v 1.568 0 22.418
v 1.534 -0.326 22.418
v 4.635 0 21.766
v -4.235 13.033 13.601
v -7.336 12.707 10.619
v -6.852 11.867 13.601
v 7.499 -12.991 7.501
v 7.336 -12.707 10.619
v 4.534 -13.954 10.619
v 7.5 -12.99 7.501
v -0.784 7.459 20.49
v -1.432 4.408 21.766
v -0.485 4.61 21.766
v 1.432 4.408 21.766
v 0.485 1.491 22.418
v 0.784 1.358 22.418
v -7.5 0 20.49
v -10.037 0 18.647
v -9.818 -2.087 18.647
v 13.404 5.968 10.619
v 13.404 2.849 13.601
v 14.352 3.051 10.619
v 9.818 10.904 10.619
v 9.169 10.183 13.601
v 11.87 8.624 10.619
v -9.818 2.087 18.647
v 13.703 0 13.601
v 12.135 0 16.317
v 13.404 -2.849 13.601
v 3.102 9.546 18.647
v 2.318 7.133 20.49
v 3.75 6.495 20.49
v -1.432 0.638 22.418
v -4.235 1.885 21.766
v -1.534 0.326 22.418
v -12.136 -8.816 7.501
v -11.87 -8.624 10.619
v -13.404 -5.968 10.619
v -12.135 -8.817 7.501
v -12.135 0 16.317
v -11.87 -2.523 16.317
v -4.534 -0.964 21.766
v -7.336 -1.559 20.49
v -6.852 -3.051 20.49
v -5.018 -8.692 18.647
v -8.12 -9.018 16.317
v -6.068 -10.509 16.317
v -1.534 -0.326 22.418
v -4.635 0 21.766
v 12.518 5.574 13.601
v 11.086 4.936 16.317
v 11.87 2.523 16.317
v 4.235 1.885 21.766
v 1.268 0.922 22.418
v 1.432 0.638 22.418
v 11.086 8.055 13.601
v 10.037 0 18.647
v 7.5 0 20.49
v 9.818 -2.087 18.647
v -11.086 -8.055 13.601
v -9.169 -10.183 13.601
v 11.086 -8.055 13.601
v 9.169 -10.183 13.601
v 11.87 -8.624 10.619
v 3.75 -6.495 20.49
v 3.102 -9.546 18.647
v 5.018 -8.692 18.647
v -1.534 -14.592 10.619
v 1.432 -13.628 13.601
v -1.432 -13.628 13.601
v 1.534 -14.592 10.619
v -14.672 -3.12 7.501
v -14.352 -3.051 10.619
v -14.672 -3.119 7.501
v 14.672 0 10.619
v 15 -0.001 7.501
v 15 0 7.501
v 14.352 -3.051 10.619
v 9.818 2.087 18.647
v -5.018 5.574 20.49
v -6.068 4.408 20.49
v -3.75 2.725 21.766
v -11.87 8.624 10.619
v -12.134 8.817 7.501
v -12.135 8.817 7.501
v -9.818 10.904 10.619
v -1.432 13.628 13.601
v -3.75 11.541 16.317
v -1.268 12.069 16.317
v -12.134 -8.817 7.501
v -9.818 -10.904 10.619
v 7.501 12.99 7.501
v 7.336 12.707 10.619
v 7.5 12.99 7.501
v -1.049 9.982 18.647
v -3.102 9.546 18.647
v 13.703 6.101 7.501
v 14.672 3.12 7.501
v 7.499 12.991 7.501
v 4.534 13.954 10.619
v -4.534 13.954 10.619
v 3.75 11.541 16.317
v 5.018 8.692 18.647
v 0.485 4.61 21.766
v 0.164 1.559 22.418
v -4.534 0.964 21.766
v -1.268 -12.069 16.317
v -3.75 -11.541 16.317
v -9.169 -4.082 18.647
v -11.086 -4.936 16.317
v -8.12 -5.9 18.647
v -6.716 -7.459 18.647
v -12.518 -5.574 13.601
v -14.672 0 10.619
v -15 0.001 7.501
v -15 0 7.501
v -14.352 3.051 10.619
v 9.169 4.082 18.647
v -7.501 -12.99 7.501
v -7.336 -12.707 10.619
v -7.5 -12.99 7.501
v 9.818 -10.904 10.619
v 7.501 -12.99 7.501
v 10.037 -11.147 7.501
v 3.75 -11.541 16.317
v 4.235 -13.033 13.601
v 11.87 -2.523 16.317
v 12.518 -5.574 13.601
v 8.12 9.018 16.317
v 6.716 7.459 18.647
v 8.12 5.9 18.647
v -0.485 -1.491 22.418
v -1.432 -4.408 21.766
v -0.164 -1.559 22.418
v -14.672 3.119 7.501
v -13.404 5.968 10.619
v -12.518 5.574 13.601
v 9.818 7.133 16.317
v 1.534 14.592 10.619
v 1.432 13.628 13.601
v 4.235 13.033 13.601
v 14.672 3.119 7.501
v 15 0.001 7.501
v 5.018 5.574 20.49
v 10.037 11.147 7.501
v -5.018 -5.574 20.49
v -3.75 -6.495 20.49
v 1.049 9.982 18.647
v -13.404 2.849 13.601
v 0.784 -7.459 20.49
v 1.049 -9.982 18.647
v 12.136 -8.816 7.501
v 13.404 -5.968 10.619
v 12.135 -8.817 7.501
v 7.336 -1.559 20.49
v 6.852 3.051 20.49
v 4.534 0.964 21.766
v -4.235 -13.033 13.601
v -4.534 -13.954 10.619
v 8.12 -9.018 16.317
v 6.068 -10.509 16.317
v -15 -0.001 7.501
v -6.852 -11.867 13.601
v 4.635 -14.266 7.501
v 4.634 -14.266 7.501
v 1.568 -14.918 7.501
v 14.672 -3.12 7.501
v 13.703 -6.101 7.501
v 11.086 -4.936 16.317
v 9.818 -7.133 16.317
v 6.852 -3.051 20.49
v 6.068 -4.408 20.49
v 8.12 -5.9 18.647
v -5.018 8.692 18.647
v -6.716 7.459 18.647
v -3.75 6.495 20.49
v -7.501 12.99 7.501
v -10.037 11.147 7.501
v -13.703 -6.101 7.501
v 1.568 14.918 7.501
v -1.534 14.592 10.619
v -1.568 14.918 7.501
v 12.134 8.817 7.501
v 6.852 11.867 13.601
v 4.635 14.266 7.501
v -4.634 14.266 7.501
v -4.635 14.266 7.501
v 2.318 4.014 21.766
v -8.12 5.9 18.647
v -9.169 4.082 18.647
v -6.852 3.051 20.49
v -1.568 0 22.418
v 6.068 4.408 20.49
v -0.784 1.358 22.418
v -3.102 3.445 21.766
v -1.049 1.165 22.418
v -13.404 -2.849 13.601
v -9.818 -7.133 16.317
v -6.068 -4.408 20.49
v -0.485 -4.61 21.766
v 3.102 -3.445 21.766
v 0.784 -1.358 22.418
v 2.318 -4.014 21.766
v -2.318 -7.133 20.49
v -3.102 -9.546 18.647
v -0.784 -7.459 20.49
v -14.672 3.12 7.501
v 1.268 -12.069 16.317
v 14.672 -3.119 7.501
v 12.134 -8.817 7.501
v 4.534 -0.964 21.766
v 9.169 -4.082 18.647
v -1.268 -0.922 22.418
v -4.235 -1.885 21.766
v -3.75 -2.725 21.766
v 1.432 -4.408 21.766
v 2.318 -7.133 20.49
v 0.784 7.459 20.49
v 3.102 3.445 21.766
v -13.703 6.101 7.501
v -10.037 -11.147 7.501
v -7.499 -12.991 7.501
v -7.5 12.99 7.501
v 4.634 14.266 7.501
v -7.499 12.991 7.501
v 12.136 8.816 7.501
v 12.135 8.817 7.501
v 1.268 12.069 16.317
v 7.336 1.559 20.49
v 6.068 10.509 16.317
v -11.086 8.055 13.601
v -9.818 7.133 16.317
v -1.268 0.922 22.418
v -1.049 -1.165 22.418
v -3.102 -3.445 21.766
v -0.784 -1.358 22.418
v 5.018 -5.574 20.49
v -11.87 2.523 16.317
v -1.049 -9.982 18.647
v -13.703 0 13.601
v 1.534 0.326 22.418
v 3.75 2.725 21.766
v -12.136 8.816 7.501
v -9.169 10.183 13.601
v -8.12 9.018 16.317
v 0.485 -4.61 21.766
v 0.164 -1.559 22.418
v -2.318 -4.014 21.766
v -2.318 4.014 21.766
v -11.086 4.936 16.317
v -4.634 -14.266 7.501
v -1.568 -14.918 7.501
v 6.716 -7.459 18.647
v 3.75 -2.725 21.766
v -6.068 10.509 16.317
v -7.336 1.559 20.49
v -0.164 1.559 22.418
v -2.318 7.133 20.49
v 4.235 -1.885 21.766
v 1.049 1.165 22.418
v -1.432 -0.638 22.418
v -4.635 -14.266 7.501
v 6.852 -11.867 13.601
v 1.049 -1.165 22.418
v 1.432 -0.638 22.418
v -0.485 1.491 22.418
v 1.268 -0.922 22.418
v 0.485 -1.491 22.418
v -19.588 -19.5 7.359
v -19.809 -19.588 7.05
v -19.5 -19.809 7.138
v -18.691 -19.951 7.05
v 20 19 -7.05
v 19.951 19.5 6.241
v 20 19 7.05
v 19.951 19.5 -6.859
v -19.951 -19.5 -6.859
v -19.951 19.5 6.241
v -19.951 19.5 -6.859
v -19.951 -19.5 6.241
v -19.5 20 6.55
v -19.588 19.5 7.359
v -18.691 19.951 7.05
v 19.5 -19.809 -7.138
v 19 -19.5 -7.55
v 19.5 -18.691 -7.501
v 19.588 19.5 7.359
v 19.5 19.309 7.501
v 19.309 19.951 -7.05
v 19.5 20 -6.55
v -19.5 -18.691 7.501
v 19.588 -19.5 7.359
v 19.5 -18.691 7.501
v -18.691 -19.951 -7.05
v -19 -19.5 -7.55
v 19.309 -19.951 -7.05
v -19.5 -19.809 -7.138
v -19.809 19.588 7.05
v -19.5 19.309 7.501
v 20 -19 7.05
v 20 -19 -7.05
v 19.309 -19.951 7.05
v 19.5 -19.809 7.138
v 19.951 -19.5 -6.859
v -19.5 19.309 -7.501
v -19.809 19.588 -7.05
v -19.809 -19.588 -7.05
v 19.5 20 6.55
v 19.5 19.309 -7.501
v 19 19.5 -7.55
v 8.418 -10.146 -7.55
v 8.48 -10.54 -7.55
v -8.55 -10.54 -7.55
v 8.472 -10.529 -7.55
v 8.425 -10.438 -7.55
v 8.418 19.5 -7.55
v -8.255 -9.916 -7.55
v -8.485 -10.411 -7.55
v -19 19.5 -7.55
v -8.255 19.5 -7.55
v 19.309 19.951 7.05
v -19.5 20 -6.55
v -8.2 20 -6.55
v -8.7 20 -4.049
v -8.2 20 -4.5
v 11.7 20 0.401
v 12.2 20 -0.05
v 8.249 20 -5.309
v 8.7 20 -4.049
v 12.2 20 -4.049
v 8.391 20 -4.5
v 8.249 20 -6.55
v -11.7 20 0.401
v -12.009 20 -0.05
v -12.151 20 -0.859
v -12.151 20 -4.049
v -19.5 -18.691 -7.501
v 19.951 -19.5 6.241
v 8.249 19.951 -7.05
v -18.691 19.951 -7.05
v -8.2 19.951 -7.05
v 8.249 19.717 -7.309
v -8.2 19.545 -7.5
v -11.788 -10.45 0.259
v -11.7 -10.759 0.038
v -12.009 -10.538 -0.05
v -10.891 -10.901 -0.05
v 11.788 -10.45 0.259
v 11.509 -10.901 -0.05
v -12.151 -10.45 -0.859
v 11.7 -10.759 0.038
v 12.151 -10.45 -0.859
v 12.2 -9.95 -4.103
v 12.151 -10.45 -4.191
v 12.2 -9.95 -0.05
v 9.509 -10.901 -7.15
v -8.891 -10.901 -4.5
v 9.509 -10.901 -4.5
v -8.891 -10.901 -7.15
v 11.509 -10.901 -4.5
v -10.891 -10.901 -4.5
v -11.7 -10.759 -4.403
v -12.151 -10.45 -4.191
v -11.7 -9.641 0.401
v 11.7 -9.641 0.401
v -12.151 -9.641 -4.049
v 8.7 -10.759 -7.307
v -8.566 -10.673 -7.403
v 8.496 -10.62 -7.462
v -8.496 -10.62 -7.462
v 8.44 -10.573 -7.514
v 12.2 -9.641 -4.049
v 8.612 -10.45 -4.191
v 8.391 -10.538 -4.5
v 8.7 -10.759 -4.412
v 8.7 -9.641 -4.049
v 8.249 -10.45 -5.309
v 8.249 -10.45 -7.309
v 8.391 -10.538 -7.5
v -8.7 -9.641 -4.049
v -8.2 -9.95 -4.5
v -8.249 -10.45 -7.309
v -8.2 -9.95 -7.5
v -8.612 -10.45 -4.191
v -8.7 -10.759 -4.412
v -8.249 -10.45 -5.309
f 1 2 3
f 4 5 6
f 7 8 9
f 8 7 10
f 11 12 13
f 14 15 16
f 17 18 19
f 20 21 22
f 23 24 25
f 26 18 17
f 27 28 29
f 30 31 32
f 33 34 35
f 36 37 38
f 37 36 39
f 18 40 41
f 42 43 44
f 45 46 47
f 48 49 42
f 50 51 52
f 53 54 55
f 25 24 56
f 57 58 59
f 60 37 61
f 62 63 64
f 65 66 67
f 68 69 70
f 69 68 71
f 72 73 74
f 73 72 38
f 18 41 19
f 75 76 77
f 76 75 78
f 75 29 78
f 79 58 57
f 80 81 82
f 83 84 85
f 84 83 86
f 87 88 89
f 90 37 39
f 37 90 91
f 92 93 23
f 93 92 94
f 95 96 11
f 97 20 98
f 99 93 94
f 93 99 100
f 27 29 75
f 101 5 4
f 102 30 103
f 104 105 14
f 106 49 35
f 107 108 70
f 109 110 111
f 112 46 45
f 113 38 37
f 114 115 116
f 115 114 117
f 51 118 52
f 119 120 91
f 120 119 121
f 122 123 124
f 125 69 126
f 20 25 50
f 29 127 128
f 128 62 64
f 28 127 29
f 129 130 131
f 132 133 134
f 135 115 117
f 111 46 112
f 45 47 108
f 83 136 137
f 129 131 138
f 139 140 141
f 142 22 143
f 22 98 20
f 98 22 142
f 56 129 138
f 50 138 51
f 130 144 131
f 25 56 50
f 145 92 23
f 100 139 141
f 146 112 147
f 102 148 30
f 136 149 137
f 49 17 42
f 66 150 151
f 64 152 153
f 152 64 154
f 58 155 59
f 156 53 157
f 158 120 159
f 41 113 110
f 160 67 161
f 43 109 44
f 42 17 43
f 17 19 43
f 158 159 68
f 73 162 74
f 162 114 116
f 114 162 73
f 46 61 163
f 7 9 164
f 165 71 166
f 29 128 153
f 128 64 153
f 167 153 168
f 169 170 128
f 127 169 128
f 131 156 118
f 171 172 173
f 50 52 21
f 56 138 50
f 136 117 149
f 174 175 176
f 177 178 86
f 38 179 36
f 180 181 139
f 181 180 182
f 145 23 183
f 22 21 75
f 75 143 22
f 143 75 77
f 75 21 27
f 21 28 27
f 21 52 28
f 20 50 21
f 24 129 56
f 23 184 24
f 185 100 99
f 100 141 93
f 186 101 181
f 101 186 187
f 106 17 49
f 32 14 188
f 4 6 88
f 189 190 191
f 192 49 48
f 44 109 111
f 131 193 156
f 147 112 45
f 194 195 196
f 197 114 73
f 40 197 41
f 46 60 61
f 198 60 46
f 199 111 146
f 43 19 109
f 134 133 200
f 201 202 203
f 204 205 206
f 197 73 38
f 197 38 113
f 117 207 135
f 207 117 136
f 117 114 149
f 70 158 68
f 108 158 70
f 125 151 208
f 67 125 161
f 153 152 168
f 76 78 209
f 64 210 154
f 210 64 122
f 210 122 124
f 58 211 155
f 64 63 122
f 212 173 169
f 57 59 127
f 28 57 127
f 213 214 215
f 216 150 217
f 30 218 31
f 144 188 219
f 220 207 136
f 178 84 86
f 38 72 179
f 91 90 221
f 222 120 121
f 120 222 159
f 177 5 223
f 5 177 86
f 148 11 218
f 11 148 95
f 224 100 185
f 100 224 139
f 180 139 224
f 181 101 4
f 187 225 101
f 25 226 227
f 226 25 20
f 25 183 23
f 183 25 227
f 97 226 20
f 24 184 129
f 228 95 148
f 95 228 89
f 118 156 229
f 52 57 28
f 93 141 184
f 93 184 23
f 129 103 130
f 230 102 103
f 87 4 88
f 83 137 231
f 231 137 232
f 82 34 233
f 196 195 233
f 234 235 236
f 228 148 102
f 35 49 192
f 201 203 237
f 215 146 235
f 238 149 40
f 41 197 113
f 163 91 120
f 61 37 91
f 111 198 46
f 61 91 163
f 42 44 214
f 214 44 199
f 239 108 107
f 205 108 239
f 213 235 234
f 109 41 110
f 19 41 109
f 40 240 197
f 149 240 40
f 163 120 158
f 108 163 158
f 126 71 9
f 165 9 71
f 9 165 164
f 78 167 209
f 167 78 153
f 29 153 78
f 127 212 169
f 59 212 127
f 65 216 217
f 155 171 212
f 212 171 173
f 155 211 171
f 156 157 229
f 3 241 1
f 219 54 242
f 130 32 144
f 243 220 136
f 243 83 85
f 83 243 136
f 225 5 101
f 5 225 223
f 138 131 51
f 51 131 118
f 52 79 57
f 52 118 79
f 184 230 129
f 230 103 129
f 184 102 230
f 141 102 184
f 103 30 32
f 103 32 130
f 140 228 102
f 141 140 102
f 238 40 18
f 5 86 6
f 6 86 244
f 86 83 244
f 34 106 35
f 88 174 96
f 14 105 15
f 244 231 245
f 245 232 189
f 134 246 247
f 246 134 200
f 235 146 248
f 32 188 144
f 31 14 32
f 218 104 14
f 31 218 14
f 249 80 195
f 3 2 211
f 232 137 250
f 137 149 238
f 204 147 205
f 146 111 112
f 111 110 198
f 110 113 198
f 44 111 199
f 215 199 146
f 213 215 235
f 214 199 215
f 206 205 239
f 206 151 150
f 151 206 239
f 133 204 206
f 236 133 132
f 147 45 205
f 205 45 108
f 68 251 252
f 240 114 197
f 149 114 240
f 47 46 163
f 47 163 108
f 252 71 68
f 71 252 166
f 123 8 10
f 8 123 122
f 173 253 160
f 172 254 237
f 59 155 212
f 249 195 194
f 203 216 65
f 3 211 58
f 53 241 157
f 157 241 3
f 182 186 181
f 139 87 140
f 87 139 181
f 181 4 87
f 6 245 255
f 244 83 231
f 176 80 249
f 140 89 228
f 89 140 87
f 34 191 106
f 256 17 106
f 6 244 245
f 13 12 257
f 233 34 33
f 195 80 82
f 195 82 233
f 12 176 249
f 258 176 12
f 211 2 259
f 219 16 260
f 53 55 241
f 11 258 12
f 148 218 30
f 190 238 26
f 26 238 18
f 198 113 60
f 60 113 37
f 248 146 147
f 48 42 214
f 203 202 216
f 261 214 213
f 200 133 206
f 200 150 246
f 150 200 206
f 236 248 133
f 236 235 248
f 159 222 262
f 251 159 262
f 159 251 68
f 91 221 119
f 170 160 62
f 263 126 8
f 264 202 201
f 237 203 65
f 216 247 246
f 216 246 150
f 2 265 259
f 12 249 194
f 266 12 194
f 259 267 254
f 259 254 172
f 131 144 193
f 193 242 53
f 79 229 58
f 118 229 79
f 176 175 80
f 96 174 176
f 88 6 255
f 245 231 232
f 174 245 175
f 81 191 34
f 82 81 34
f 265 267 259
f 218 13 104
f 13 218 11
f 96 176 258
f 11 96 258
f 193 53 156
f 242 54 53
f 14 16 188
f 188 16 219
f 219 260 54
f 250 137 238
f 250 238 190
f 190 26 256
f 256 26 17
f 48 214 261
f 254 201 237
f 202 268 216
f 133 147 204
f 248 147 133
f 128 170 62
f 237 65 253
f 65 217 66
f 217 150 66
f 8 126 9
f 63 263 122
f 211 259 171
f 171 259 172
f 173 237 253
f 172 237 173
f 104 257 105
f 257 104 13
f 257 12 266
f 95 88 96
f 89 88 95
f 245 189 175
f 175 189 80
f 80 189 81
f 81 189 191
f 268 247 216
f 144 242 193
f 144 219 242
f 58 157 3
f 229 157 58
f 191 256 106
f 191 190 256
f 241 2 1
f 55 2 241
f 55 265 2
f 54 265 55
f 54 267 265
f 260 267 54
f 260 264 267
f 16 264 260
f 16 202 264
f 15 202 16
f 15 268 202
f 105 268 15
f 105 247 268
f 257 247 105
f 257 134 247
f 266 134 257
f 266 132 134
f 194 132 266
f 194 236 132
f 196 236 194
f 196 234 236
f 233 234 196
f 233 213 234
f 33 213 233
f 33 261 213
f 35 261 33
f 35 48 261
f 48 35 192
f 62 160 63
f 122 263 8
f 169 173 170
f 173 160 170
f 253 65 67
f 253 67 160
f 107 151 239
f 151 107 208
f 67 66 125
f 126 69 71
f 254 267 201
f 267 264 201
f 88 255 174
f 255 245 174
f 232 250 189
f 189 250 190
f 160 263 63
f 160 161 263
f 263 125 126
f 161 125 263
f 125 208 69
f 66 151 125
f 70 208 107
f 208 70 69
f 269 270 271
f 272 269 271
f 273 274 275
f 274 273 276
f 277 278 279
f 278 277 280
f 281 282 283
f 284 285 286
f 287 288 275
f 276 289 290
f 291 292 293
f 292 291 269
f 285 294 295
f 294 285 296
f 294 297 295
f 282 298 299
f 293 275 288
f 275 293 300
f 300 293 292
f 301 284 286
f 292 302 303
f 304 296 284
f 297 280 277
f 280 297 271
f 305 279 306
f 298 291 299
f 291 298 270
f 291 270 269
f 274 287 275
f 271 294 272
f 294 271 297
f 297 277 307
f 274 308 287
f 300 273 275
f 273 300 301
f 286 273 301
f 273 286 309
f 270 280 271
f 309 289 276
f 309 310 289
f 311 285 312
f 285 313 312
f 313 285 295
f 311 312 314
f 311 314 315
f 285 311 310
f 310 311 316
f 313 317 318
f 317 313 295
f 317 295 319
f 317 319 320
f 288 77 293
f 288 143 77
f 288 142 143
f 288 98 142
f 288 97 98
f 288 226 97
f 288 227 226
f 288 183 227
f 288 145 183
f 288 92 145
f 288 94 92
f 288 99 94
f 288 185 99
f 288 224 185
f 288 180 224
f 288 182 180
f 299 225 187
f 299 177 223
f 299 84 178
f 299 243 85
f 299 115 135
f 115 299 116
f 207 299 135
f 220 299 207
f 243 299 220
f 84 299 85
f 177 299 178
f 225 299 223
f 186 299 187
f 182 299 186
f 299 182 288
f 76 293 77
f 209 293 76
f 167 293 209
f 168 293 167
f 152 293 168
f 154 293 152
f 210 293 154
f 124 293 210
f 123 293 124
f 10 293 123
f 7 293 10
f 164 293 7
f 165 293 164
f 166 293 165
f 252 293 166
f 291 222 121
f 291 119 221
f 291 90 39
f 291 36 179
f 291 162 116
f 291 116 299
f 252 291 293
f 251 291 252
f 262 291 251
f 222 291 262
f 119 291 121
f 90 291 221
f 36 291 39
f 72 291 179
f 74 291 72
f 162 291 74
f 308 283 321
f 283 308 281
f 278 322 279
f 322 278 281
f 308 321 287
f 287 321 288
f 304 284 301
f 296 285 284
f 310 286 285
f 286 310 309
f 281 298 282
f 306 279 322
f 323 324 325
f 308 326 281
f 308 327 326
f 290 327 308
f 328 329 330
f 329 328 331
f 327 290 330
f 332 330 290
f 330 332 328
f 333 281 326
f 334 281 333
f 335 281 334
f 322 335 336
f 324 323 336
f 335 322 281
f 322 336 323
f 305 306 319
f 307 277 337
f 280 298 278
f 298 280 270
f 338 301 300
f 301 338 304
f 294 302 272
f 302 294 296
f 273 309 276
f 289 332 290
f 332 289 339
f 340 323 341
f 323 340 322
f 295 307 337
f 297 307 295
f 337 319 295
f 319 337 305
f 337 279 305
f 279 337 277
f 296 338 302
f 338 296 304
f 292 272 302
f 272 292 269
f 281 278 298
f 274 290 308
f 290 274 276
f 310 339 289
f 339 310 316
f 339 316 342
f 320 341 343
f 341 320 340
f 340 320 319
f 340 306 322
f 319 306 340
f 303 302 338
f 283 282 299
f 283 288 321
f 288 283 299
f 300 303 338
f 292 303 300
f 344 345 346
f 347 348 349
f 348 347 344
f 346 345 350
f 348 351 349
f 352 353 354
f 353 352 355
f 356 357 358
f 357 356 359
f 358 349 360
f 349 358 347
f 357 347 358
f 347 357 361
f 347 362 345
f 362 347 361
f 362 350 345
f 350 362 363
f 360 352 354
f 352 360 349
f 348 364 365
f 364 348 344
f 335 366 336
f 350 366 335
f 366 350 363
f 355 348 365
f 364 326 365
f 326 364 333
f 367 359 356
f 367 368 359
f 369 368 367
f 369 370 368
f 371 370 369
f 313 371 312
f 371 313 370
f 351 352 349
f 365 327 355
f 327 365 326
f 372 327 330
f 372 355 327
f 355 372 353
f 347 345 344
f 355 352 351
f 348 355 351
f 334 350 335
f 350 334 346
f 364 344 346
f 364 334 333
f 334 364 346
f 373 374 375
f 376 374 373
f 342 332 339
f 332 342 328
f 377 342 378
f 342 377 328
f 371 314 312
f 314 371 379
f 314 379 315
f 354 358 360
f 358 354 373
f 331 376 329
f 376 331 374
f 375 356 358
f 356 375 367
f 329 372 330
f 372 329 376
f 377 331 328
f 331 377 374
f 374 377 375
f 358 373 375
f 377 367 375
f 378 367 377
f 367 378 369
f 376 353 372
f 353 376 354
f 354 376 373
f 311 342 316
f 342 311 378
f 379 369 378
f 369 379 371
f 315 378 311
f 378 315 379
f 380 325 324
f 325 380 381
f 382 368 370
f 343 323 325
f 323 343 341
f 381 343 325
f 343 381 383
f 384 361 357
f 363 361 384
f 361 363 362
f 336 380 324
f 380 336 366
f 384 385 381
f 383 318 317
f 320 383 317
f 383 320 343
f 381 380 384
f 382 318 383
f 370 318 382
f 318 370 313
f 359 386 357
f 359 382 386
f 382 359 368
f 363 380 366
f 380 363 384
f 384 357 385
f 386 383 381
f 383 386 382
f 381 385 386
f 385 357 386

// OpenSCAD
clampwidth = 23.4;
clampthick = 4;

difference(){
    spherepodium();
    translate([0,14.05,-3.6])holes();
}

module spherepodium(){
	union(){
		translate([0,0,7.5])topsphere();
		color("Yellow") RoundCube(40,40,15.1,1);
	}
}

module topsphere(){
	intersection(){
         color("Blue") sphere(15);
        translate([0,0,50])color("Red") cube(100, center=true);
    }
}

module intersector() {
    color("Red") cube(100, center=true);
}

module holes() {
    difference(){
        color("Green") RoundCube(clampwidth+1,50,8.1,1);
        translate([clampwidth/2-1,0,-clampthick/2-.4])color("Green") RoundCube(5,50,4,1);
        translate([-clampwidth/2+1,0,-clampthick/2-.4])color("Green") RoundCube(5,50,4,1);
    }
}

module RoundCube(cubelength,cubewidth,cubeheight,cuberound){
	hull(){
			translate([cubelength/2-cuberound,cubewidth/2-cuberound,-(cubeheight-cuberound)/2])cylinder(h=cubeheight-cuberound,r=cuberound);
			translate([cubelength/2-cuberound,-cubewidth/2+cuberound,-(cubeheight-cuberound)/2])cylinder(h=cubeheight-cuberound,r=cuberound);
			translate([-cubelength/2+cuberound,cubewidth/2-cuberound,-(cubeheight-cuberound)/2])cylinder(h=cubeheight-cuberound,r=cuberound);
			translate([-cubelength/2+cuberound,-cubewidth/2+cuberound,-(cubeheight-cuberound)/2])cylinder(h=cubeheight-cuberound,r=cuberound);
			rotate([0,90,90]){
			translate([cubeheight/2-cuberound,cubelength/2-cuberound,-(cubewidth-cuberound)/2])cylinder(h=cubewidth-cuberound,r=cuberound);
			translate([cubeheight/2-cuberound,-cubelength/2+cuberound,-(cubewidth-cuberound)/2])cylinder(h=cubewidth-cuberound,r=cuberound);
			translate([-cubeheight/2+cuberound,cubelength/2-cuberound,-(cubewidth-cuberound)/2])cylinder(h=cubewidth-cuberound,r=cuberound);
			translate([-cubeheight/2+cuberound,-cubelength/2+cuberound,-(cubewidth-cuberound)/2])cylinder(h=cubewidth-cuberound,r=cuberound);
			}
			rotate([90,0,90]){
			translate([cubewidth/2-cuberound,cubeheight/2-cuberound,-(cubelength-cuberound)/2])cylinder(h=cubelength-cuberound,r=cuberound);
			translate([cubewidth/2-cuberound,-cubeheight/2+cuberound,-(cubelength-cuberound)/2])cylinder(h=cubelength-cuberound,r=cuberound);
			translate([-cubewidth/2+cuberound,cubeheight/2-cuberound,-(cubelength-cuberound)/2])cylinder(h=cubelength-cuberound,r=cuberound);
			translate([-cubewidth/2+cuberound,-cubeheight/2+cuberound,-(cubelength-cuberound)/2])cylinder(h=cubelength-cuberound,r=cuberound);
			}
	}
}
